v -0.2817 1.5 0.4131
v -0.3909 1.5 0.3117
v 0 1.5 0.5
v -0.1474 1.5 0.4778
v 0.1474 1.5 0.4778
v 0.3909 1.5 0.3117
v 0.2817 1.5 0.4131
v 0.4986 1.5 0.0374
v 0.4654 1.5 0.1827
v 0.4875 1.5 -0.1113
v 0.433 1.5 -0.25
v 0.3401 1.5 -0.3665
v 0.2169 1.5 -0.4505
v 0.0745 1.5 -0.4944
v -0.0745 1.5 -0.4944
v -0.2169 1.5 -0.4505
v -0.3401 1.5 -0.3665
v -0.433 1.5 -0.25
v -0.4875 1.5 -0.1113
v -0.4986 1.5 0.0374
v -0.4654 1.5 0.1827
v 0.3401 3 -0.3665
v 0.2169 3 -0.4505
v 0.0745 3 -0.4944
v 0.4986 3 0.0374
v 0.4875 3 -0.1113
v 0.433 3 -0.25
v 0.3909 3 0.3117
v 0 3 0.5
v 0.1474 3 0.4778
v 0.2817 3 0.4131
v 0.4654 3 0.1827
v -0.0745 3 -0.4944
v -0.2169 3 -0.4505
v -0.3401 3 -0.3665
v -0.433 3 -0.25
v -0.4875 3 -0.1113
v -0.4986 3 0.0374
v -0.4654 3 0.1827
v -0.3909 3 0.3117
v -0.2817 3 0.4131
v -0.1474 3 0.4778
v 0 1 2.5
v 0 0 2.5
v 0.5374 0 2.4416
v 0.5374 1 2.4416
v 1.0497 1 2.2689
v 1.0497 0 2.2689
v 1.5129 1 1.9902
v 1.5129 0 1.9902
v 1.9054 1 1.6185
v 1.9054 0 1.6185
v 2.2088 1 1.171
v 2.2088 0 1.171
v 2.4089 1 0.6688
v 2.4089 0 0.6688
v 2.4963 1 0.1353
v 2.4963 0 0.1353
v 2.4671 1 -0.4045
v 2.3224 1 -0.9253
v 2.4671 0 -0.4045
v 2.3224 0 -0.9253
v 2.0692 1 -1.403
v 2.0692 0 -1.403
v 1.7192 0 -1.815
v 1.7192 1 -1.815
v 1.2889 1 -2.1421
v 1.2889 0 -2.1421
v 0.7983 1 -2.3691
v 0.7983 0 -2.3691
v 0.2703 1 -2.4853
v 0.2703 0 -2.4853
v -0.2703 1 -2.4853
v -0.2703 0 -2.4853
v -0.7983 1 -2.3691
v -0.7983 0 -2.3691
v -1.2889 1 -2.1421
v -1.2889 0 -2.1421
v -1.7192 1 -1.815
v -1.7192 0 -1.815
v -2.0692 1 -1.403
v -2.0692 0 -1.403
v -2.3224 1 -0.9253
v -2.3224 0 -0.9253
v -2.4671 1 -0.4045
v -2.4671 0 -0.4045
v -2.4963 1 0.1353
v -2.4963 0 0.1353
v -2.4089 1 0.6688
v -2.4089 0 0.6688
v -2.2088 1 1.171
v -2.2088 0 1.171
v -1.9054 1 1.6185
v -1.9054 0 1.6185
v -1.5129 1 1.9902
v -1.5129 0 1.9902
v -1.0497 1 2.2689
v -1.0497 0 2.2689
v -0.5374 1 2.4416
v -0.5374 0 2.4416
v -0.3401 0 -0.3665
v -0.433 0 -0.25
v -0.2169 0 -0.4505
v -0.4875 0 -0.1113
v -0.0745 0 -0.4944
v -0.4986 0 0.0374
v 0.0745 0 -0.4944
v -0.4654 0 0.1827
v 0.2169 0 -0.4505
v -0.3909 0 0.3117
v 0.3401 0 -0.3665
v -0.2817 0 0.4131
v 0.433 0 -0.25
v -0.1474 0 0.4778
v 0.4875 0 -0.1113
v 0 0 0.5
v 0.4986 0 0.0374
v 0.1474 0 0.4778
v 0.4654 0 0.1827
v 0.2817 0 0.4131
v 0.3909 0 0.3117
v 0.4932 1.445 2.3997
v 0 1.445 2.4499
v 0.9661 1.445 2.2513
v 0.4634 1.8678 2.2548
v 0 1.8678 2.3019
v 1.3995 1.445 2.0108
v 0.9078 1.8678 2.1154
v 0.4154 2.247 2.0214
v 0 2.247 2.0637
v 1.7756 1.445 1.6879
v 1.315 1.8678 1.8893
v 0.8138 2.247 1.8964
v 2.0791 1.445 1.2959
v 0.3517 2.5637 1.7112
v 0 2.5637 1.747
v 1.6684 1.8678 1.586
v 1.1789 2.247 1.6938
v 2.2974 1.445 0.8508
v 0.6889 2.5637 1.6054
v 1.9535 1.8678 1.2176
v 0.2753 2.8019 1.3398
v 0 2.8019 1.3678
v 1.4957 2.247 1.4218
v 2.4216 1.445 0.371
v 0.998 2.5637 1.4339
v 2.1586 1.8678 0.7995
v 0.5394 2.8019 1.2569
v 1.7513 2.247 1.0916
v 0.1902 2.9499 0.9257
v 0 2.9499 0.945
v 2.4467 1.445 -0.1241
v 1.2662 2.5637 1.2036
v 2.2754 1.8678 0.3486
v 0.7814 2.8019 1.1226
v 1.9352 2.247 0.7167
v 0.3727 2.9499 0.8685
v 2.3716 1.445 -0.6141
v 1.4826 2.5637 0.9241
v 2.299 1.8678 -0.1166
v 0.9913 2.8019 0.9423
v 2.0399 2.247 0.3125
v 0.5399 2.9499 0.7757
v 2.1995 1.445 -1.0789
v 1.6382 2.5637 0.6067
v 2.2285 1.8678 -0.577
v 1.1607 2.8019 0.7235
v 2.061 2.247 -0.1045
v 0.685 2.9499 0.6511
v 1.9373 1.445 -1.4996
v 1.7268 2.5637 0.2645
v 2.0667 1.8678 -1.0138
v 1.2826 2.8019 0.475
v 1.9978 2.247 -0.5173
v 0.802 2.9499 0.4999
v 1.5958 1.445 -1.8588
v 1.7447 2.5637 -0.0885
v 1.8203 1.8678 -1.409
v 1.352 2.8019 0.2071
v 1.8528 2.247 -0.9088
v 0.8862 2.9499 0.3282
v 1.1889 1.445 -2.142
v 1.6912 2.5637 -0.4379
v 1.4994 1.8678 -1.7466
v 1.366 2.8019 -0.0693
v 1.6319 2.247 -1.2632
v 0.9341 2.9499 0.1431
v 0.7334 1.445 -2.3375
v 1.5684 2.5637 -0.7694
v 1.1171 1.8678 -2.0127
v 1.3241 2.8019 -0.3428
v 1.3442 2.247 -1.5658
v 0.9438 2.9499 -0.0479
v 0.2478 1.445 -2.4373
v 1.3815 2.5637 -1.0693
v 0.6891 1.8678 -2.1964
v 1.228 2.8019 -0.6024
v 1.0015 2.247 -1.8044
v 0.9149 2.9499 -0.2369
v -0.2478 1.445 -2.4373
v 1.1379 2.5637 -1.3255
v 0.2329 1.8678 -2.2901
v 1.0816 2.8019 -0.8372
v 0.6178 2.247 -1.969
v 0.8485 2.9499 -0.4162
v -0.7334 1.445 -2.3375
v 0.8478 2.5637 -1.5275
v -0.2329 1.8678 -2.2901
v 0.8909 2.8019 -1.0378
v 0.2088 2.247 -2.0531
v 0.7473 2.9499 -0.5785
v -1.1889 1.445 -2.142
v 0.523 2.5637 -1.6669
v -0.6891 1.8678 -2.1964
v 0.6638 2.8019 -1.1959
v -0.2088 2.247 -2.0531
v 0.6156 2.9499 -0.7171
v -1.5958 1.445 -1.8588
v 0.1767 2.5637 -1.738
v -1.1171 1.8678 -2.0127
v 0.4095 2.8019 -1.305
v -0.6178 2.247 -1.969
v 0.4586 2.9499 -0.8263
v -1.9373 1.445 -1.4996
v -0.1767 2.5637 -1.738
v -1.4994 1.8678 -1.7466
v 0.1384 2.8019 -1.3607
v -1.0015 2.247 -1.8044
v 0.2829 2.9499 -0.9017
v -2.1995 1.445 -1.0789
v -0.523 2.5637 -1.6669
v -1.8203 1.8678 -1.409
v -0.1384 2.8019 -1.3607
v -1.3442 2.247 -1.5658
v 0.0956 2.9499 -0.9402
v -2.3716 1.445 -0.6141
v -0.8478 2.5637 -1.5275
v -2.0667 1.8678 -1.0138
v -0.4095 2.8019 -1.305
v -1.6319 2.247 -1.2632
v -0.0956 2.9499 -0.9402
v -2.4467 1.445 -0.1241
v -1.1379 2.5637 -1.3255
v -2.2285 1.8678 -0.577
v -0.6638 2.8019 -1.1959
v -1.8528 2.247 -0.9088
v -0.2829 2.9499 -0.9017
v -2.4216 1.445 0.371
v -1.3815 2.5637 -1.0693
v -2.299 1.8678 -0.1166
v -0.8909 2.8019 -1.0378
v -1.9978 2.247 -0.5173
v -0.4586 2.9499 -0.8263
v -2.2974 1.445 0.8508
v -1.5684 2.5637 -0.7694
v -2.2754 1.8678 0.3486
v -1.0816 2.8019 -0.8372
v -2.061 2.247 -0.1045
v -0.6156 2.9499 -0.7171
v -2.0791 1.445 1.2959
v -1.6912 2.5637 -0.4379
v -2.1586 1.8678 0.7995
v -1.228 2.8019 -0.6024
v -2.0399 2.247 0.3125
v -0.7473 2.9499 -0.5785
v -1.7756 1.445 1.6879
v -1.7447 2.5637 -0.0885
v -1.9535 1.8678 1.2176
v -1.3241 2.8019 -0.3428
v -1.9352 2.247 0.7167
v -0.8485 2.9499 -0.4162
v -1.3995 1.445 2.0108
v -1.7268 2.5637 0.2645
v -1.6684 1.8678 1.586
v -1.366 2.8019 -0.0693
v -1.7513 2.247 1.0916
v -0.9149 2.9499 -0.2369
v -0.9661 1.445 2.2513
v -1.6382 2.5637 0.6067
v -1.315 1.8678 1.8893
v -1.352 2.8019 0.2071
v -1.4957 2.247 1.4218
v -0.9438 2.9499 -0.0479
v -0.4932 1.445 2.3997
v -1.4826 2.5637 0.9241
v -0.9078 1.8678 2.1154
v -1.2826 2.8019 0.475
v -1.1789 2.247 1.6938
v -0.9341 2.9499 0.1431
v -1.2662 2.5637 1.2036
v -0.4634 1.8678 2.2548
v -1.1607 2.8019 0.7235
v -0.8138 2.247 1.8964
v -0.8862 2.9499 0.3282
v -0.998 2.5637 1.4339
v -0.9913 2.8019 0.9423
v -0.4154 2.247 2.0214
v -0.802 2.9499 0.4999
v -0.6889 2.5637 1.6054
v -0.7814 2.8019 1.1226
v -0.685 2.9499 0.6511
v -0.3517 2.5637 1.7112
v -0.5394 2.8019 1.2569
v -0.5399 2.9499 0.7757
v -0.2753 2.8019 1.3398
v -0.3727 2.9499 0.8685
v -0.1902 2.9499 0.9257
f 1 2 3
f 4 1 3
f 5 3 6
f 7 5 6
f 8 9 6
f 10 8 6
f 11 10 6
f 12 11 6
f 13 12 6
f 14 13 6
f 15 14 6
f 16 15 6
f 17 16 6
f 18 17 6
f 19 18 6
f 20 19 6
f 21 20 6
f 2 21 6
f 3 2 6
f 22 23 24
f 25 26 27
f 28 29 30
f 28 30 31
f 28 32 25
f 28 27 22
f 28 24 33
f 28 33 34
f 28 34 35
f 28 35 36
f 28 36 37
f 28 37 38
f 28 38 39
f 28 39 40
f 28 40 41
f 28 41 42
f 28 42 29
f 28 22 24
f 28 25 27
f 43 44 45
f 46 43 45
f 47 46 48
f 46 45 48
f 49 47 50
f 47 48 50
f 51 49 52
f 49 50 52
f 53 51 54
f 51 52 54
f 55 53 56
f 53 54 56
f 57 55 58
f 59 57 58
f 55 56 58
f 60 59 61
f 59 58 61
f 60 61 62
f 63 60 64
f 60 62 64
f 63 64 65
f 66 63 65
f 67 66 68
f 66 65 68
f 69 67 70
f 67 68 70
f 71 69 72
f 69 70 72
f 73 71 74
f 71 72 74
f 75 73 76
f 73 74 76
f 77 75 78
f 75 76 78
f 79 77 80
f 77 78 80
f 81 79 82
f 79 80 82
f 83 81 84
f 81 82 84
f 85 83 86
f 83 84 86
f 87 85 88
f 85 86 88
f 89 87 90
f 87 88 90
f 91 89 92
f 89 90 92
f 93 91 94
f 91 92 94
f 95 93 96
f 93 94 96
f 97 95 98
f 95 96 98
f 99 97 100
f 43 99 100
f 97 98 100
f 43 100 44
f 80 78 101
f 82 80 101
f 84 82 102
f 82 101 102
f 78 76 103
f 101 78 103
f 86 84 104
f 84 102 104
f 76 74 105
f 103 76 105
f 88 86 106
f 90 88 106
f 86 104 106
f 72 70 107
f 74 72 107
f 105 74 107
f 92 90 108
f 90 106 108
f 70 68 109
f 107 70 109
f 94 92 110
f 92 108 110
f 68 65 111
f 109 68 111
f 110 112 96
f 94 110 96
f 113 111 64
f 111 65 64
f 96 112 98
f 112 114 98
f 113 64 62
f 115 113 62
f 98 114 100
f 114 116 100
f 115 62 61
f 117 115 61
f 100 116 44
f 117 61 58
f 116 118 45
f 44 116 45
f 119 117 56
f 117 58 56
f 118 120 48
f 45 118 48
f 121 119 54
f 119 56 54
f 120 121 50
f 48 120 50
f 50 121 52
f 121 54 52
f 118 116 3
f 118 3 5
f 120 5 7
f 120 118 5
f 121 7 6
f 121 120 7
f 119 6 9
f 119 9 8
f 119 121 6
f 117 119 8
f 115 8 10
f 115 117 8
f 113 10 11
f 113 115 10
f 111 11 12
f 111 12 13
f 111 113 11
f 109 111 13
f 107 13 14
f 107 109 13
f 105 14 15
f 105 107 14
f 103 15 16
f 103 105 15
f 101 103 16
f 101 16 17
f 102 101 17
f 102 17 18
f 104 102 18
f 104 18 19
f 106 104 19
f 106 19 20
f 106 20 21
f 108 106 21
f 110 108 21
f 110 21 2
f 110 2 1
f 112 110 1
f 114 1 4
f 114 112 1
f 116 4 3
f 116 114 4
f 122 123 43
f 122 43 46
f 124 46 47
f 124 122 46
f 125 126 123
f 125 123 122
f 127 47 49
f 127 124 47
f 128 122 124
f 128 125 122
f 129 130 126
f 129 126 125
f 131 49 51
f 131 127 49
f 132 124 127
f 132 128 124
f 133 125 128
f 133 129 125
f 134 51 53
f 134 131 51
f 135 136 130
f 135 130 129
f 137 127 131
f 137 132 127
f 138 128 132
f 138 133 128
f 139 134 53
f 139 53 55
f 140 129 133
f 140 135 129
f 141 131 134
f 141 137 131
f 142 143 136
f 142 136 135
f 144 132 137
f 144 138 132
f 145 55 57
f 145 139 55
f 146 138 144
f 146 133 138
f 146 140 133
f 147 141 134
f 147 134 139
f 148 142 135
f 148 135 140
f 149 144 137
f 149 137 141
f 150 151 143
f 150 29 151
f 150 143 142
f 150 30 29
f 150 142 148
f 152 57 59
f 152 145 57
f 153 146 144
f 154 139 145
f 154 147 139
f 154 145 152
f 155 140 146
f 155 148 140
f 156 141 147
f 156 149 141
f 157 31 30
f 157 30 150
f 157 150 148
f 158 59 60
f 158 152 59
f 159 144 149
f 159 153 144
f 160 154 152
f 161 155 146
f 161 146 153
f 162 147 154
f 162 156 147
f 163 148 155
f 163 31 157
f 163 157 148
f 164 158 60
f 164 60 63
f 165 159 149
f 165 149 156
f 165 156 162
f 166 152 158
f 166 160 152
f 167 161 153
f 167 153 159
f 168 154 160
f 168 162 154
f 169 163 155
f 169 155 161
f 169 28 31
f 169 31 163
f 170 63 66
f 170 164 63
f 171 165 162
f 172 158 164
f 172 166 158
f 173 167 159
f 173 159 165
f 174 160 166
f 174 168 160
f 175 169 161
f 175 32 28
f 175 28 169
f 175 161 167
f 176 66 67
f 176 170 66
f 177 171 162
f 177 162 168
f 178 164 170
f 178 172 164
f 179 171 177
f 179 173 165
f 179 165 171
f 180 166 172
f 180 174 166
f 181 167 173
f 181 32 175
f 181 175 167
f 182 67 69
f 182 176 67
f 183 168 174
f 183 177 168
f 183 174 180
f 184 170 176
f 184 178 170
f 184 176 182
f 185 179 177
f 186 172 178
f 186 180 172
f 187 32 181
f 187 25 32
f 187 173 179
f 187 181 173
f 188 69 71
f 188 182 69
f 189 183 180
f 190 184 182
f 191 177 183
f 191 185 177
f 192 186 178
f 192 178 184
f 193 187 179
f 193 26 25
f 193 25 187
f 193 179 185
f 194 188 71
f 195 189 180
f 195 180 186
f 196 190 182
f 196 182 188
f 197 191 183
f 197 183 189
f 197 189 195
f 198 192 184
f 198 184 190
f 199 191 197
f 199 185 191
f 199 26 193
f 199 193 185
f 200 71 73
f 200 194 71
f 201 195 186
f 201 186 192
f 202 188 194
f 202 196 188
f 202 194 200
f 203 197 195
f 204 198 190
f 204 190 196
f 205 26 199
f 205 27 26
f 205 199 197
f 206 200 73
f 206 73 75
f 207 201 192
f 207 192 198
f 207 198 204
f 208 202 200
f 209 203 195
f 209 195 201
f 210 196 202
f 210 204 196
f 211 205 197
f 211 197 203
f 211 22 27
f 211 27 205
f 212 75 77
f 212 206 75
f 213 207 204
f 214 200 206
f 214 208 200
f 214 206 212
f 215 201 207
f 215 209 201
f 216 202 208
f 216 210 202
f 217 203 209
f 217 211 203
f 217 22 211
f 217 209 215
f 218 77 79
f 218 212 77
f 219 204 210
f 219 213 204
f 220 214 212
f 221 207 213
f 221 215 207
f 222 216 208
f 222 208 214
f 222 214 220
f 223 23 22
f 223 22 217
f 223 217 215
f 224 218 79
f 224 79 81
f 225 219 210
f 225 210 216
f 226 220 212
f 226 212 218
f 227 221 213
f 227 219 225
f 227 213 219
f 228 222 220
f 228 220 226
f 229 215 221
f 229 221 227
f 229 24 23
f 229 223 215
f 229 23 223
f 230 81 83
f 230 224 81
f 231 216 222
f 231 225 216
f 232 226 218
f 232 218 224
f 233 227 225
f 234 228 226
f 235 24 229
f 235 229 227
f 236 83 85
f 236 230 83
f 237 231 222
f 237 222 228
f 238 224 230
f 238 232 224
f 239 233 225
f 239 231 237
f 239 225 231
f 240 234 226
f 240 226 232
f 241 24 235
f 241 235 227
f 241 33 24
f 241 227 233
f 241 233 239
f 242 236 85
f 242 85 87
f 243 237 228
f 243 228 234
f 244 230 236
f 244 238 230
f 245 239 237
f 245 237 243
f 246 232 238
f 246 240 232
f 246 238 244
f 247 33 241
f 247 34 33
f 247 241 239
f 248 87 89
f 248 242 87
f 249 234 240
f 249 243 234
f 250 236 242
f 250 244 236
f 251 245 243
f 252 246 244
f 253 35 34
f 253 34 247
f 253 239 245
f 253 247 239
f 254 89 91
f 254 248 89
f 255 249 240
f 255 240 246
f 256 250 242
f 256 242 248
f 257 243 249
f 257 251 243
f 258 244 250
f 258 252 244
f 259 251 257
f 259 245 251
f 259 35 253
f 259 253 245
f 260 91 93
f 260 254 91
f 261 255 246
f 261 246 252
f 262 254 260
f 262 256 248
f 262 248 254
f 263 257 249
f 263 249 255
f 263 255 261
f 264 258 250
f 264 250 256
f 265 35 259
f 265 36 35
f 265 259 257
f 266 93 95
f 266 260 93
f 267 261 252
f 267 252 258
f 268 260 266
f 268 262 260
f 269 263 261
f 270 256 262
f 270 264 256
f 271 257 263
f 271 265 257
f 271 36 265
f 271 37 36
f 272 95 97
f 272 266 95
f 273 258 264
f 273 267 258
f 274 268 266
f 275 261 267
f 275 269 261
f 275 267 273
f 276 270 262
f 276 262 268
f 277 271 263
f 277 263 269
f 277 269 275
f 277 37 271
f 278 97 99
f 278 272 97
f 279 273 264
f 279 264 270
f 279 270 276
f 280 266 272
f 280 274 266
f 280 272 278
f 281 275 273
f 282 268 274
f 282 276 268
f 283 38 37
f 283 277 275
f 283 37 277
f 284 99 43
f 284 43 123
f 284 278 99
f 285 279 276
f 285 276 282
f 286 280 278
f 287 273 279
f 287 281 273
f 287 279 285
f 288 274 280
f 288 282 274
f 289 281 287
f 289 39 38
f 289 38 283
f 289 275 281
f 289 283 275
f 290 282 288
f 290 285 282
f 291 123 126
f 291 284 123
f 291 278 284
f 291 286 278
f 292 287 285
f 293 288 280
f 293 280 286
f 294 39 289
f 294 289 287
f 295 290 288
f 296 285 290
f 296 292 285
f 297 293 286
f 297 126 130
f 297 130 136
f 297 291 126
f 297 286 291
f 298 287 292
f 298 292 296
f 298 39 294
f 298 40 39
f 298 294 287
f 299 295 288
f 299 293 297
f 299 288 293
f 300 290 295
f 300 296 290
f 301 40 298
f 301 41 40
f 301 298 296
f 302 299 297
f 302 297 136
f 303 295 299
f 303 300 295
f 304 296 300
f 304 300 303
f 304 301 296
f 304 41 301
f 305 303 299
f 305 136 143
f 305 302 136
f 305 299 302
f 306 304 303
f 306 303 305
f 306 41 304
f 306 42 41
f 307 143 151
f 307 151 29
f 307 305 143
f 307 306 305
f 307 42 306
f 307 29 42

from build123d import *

# Parameters (mm, degrees)
SKETCH1_R           = 2.5
BOSS_EXTRUDE1_DEPTH = 3
SKETCH3_R           = 0.5
CUT_EXTRUDE1_DEPTH  = 1.5
FILLET1_R           = 2


with BuildPart() as part:
    # Sketch1 → Boss-Extrude1 (new body)
    with BuildSketch(Plane(origin=(0, 0, 0), x_dir=(1, 0, 0), z_dir=(0, 1, 0))):
        with Locations(Location((0, 0, 0), (0, 0, 270))):
            Circle(SKETCH1_R)
    extrude(amount=BOSS_EXTRUDE1_DEPTH)

    # Sketch3 → Cut-Extrude1 (cut)
    with BuildSketch(Plane(origin=(0, 0, 0), x_dir=(1, 0, 0), z_dir=(0, 1, 0))):
        with Locations(Location((0, 0, 0), (0, 0, 270))):
            Circle(SKETCH3_R)
    extrude(amount=CUT_EXTRUDE1_DEPTH, mode=Mode.SUBTRACT)

    # Fillet1
    fillet1_edges = [part.edges().sort_by_distance(p)[0] for p in [
        (0, 3, -2.5),
    ]]
    fillet(fillet1_edges, radius=FILLET1_R)


solid = part.part
